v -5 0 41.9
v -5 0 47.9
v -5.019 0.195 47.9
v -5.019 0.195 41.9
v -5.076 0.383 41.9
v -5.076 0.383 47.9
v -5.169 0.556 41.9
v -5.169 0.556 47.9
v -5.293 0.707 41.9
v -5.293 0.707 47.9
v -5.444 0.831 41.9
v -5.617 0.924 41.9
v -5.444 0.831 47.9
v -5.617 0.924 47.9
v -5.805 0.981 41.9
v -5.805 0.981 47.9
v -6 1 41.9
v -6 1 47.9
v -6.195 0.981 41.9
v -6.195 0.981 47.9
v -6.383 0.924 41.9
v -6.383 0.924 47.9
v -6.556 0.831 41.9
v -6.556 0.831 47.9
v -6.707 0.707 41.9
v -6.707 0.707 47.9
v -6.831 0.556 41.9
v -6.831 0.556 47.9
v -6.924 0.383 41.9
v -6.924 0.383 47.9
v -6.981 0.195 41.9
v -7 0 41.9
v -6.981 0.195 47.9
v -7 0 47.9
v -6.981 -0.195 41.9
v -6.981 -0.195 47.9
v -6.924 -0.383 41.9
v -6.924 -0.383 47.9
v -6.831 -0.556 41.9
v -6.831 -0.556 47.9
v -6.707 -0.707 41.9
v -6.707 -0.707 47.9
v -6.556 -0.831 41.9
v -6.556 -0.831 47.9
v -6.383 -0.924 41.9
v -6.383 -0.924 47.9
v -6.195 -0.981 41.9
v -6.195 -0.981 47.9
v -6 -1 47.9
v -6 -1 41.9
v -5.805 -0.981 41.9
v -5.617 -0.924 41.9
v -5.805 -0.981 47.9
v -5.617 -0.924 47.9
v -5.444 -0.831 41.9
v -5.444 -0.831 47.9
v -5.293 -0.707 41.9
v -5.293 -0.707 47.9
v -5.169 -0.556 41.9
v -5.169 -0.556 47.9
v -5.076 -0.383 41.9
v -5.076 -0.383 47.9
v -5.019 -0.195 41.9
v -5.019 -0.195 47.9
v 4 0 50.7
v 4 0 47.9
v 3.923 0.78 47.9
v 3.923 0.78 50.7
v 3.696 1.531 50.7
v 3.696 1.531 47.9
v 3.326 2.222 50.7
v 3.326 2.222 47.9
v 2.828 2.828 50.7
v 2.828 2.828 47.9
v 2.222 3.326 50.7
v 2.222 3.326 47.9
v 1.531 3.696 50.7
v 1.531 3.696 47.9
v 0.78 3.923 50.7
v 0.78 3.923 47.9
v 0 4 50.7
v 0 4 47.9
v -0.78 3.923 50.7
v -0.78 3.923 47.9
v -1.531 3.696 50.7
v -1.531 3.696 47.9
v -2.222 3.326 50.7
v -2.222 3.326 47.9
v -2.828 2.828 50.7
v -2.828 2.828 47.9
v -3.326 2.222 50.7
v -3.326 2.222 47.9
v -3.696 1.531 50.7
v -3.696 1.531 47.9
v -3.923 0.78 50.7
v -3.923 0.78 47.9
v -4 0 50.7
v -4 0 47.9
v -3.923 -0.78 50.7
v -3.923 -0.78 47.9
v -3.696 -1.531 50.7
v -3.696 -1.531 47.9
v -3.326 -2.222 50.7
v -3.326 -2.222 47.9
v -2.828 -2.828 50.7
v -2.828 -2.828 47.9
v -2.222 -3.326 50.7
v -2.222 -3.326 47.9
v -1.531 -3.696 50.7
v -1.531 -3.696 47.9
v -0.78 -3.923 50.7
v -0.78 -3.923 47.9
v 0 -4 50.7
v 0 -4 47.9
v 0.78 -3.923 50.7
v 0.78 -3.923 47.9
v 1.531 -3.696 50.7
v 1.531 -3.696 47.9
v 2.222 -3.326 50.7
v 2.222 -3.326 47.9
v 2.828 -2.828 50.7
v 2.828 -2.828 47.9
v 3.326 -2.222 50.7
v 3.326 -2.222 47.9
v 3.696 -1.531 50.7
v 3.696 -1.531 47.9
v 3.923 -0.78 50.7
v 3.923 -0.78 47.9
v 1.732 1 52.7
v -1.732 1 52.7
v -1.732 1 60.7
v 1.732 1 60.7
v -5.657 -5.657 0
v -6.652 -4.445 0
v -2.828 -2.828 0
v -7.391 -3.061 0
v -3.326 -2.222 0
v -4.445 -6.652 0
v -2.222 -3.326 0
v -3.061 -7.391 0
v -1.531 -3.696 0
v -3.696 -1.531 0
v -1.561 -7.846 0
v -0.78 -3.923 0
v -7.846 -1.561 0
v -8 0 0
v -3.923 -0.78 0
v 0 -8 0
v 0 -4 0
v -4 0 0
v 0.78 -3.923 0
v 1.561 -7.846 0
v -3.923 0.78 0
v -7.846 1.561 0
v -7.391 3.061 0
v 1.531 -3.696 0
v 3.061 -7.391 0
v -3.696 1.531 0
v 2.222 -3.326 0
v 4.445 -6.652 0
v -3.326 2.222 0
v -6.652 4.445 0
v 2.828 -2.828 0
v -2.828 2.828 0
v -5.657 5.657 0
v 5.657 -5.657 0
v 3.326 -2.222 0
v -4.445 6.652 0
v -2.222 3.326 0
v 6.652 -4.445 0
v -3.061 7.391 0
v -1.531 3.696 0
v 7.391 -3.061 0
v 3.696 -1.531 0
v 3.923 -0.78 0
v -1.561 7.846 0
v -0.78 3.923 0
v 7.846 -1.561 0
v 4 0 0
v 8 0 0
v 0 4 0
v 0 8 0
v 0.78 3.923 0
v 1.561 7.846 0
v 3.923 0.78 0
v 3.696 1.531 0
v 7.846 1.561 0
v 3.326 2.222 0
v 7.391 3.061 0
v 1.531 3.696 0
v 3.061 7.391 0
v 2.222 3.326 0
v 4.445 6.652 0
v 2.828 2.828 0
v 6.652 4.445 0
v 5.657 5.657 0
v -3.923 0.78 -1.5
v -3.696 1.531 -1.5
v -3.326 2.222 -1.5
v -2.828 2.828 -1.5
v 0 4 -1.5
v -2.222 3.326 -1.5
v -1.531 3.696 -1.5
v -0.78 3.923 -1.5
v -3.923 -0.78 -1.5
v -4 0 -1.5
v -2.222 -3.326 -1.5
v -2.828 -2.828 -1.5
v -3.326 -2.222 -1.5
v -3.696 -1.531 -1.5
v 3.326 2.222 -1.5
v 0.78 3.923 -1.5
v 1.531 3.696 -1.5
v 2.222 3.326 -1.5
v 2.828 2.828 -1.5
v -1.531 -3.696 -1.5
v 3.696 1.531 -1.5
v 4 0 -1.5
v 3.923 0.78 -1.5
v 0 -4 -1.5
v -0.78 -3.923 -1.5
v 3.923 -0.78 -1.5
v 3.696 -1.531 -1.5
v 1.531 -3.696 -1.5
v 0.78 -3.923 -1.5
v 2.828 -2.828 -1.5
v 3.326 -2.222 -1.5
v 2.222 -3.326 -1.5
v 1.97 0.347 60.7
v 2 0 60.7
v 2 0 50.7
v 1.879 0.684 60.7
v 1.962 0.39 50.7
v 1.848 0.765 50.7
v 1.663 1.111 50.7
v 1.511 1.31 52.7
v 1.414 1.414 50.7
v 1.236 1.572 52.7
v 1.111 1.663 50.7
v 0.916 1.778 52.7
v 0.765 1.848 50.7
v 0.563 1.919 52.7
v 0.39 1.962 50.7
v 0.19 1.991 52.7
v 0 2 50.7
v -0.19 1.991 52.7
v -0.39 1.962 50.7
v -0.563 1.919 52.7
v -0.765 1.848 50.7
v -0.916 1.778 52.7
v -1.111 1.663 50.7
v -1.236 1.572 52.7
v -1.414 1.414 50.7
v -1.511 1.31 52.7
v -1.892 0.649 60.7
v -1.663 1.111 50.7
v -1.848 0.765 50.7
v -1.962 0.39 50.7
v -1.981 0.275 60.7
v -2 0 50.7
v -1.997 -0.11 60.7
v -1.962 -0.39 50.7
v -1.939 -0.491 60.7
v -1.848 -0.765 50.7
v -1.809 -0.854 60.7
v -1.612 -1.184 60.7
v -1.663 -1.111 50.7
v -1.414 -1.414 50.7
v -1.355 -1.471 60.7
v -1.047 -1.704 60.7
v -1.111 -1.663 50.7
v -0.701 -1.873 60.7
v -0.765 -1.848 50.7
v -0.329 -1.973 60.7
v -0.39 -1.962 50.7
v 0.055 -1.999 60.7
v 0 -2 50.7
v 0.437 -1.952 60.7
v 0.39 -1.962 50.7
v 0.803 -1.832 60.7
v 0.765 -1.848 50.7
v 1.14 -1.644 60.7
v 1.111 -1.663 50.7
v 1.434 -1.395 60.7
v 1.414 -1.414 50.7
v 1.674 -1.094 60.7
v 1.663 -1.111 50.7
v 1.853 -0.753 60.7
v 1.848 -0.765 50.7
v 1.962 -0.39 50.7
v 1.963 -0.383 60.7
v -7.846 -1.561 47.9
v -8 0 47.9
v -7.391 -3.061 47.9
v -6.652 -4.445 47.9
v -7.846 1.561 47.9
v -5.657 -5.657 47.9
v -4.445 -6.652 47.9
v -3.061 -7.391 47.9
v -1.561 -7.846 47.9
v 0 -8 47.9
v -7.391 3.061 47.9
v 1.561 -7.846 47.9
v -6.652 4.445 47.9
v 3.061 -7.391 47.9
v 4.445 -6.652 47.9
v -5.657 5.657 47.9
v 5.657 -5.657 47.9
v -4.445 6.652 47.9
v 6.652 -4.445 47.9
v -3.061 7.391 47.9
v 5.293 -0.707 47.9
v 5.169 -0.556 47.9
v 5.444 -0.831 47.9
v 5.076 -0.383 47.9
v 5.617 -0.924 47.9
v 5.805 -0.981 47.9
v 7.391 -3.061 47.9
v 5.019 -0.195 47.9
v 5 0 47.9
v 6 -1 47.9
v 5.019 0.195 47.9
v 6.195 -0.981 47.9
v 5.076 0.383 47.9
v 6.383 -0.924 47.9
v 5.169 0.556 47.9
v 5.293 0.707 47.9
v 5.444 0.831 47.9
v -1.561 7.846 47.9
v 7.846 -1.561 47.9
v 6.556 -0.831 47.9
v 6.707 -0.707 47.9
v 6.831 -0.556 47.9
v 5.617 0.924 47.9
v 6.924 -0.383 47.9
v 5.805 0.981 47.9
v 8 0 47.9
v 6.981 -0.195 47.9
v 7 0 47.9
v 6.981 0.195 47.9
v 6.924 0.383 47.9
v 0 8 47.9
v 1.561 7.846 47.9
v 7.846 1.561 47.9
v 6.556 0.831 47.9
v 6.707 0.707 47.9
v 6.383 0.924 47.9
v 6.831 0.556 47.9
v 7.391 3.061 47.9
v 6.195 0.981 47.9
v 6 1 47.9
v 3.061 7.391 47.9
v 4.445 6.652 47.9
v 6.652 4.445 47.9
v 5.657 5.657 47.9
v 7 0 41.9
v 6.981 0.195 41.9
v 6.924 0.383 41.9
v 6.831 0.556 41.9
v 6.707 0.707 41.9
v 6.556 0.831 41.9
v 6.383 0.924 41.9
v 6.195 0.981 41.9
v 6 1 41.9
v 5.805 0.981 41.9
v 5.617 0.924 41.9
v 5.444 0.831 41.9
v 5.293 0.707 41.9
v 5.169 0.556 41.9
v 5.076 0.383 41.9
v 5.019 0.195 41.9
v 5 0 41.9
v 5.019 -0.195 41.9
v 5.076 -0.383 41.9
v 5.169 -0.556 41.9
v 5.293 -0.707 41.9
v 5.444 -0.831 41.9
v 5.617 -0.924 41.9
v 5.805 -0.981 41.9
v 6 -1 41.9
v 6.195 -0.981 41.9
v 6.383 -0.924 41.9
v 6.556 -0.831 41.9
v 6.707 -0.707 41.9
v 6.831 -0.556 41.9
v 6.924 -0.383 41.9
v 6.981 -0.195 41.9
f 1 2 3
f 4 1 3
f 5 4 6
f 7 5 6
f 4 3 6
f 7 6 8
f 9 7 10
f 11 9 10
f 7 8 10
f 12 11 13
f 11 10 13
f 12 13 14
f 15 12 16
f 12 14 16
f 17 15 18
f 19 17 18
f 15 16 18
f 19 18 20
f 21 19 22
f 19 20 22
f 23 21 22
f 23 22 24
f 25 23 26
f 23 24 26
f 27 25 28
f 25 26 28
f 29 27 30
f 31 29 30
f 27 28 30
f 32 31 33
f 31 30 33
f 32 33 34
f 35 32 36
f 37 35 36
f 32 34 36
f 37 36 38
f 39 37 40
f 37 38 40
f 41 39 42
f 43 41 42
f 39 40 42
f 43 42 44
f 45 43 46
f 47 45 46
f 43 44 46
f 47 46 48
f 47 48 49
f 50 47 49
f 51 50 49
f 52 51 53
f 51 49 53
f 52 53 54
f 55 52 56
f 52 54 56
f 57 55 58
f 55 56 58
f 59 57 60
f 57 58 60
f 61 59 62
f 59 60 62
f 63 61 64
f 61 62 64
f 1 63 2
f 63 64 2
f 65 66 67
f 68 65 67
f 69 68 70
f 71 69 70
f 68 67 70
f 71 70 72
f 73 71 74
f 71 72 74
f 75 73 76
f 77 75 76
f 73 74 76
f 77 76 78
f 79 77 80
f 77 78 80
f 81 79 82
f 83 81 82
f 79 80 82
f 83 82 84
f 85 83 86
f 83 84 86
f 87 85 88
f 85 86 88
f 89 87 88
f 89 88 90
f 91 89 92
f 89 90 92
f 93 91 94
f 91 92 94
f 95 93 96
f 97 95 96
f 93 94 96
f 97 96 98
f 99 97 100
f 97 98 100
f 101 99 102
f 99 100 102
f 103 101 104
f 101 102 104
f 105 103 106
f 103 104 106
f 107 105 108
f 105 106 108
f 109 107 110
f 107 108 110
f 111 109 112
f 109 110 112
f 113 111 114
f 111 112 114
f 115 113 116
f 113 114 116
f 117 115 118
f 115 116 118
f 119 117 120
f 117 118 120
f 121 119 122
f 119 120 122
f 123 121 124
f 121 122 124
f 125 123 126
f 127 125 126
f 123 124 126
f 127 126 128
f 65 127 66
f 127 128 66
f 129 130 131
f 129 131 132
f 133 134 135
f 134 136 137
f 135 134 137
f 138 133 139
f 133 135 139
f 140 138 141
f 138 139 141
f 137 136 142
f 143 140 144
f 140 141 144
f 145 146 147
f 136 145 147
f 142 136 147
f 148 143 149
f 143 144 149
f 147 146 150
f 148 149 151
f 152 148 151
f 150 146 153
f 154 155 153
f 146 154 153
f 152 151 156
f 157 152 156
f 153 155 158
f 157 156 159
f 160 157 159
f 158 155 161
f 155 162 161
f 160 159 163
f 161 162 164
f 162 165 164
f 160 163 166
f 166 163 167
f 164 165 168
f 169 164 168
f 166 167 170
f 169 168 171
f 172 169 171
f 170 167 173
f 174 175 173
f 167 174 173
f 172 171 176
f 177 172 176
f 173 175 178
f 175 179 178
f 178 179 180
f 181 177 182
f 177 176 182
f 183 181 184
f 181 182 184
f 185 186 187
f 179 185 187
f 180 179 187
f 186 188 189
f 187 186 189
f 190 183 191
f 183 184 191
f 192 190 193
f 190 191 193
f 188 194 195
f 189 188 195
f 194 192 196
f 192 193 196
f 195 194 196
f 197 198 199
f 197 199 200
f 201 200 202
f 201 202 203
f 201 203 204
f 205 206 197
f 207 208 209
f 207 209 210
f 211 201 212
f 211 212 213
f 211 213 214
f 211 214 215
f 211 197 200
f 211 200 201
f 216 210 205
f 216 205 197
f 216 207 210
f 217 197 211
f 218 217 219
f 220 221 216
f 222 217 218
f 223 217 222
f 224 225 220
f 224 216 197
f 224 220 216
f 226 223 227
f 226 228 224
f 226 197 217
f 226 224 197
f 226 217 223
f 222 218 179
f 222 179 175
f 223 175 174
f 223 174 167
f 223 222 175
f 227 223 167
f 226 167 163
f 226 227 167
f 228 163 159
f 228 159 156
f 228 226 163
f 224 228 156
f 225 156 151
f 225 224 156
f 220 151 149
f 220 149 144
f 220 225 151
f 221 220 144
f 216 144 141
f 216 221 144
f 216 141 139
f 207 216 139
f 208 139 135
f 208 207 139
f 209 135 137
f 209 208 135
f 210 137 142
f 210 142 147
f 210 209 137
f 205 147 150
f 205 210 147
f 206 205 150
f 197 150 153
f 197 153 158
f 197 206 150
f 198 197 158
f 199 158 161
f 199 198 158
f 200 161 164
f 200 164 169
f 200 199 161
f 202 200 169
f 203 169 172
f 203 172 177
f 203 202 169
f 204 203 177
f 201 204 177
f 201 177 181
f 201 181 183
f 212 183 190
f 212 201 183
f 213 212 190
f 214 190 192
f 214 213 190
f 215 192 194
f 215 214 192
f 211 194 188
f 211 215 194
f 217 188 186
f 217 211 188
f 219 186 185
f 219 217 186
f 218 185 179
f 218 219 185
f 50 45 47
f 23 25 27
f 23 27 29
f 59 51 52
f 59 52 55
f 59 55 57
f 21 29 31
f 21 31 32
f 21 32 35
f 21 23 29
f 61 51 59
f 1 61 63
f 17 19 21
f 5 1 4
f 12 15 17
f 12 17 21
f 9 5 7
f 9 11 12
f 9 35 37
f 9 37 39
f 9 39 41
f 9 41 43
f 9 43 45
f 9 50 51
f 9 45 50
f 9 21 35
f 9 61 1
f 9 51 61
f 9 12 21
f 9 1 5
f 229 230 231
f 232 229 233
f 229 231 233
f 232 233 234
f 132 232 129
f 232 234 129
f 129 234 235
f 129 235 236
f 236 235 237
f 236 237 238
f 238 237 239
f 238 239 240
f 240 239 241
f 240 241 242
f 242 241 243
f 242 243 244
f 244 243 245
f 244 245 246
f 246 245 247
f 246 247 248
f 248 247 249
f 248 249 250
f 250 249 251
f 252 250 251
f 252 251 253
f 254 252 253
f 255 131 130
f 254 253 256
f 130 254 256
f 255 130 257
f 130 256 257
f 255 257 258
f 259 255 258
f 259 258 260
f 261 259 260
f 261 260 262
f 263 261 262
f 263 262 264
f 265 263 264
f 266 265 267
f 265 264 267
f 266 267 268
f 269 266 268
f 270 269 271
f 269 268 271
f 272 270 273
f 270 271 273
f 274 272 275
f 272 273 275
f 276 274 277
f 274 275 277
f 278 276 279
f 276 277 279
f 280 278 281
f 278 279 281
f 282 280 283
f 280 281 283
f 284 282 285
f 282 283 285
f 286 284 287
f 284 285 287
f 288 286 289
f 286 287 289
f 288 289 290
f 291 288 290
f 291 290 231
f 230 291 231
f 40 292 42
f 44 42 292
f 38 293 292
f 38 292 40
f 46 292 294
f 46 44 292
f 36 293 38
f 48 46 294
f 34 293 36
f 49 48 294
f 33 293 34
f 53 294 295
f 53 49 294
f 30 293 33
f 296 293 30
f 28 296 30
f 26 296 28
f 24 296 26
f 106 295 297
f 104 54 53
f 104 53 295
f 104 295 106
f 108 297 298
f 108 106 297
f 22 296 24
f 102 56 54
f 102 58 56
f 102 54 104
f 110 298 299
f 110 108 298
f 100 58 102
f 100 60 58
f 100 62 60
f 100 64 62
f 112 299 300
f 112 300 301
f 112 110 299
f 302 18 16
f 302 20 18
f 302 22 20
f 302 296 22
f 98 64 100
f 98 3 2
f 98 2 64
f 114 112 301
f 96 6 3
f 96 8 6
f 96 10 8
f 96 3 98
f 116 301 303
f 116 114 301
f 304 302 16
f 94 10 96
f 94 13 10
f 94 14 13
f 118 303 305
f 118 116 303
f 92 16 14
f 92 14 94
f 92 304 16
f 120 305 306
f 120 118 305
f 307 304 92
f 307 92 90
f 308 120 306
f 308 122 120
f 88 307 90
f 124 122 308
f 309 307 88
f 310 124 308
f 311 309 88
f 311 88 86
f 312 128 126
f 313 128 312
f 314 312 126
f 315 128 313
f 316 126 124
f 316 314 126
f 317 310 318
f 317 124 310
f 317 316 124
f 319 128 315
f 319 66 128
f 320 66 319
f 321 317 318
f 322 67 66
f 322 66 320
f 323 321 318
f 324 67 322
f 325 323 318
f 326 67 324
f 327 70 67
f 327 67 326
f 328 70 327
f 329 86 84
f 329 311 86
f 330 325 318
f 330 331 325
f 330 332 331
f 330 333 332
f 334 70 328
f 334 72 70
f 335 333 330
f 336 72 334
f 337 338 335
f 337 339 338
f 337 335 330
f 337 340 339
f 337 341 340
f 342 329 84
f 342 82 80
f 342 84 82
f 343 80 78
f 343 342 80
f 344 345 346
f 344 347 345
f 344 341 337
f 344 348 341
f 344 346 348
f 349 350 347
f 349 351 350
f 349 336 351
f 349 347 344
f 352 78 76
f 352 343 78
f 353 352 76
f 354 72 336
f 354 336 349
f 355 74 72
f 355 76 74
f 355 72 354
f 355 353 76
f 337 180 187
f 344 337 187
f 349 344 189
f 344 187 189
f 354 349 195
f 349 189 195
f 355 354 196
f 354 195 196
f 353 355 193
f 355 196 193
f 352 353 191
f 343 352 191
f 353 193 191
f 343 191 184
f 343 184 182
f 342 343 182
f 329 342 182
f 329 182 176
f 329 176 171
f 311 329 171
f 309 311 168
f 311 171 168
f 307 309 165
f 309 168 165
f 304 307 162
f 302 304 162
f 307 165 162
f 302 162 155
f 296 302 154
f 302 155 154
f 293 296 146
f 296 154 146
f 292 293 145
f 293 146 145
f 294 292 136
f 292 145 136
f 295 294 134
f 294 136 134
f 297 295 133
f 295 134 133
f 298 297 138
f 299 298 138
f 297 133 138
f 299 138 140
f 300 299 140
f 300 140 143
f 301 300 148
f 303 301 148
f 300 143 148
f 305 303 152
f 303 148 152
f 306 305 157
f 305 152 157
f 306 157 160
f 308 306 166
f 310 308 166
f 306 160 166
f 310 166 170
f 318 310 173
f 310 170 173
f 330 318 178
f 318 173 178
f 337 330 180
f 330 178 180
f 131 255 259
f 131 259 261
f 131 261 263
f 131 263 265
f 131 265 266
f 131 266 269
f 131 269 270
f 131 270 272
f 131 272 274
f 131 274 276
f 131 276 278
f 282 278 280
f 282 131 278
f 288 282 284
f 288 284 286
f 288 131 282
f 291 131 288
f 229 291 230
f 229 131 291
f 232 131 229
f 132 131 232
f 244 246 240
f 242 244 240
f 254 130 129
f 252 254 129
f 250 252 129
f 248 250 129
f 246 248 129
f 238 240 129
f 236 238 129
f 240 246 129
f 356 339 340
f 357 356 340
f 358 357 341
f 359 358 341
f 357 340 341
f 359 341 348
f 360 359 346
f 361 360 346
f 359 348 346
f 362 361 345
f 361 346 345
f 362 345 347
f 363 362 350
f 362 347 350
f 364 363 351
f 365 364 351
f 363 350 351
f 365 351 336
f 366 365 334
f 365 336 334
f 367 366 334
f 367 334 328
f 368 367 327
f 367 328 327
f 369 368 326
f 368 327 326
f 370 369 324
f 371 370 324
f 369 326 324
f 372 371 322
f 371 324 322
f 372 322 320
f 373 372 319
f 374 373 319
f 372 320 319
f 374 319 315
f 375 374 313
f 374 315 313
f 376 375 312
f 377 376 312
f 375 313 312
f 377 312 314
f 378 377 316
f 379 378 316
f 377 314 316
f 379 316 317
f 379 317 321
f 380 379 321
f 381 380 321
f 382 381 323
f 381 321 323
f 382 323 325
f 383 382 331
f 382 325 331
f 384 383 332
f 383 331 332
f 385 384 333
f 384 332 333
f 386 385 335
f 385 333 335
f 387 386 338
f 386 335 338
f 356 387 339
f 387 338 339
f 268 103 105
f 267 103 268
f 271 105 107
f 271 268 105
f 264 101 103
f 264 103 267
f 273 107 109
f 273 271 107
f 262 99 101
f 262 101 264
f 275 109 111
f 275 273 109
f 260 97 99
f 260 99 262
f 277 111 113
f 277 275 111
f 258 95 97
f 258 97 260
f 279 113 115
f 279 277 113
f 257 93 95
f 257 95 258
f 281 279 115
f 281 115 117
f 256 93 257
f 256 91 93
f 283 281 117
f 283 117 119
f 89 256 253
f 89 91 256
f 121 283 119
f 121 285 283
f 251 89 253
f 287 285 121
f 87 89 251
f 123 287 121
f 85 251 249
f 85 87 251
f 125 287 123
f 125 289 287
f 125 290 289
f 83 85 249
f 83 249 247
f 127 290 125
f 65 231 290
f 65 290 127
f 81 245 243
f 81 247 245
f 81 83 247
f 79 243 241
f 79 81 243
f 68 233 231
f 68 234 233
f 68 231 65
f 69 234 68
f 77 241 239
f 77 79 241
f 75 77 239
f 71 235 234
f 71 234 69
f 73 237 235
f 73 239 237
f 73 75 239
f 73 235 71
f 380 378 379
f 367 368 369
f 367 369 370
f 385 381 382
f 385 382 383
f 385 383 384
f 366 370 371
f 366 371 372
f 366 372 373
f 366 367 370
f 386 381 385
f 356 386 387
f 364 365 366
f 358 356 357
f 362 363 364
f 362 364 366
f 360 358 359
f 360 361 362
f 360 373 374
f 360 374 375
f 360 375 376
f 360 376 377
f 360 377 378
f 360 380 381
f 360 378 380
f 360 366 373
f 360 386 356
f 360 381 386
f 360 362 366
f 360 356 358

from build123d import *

# Parameters (mm, degrees)
ESQUISSE1_R             = 8
BOSS_EXTRU_1_DEPTH      = 47.9
ESQUISSE2_R             = 4
BOSS_EXTRU_2_DEPTH      = 2.8
ESQUISSE3_R             = 2
BOSS_EXTRU_3_DEPTH      = 10
ESQUISSE5_W             = 4
ESQUISSE5_H             = 8
ENL_V_MAT_EXTRU_1_DEPTH = 10
BOSS_EXTRU_4_START      = 1.5
ESQUISSE6_R             = 4
BOSS_EXTRU_4_DEPTH      = 1.5
ESQUISSE7_R             = 1
ENL_V_MAT_EXTRU_2_DEPTH = 6


with BuildPart() as part:
    # Esquisse1 → Boss.-Extru.1 (new body)
    with BuildSketch(Plane.XY):
        Circle(ESQUISSE1_R)
    extrude(amount=BOSS_EXTRU_1_DEPTH)

    # Esquisse2 → Boss.-Extru.2 (add)
    with BuildSketch(Plane.XY.offset(47.9)):
        Circle(ESQUISSE2_R)
    extrude(amount=BOSS_EXTRU_2_DEPTH)

    # Esquisse3 → Boss.-Extru.3 (add)
    with BuildSketch(Plane.XY.offset(50.7)):
        Circle(ESQUISSE3_R)
    extrude(amount=BOSS_EXTRU_3_DEPTH)

    # Esquisse5 → Enlèv. mat.-Extru.1 (cut)
    with BuildSketch(Plane(origin=(0, 1, 0), x_dir=(1, 0, 0), z_dir=(0, 1, 0))):
        with Locations((0, -56.7)):
            Rectangle(ESQUISSE5_W, ESQUISSE5_H)
    extrude(amount=ENL_V_MAT_EXTRU_1_DEPTH, mode=Mode.SUBTRACT)

    # Esquisse6 → Boss.-Extru.4 (add)
    with BuildSketch(Plane(origin=(0, 0, 0), x_dir=(-1, 0, 0), z_dir=(0, 0, -1)).offset(BOSS_EXTRU_4_START)):
        with Locations(Location((0, 0, 0), (0, 0, 180))):
            Circle(ESQUISSE6_R)
    extrude(amount=-BOSS_EXTRU_4_DEPTH)

    # Esquisse7 → Enlèv. mat.-Extru.2 (cut)
    with BuildSketch(Plane.XY.offset(47.9)):
        with Locations((6, 0)):
            Circle(ESQUISSE7_R)
        with Locations((-6, 0)):
            Circle(ESQUISSE7_R)
    extrude(amount=-ENL_V_MAT_EXTRU_2_DEPTH, mode=Mode.SUBTRACT)


solid = part.part
